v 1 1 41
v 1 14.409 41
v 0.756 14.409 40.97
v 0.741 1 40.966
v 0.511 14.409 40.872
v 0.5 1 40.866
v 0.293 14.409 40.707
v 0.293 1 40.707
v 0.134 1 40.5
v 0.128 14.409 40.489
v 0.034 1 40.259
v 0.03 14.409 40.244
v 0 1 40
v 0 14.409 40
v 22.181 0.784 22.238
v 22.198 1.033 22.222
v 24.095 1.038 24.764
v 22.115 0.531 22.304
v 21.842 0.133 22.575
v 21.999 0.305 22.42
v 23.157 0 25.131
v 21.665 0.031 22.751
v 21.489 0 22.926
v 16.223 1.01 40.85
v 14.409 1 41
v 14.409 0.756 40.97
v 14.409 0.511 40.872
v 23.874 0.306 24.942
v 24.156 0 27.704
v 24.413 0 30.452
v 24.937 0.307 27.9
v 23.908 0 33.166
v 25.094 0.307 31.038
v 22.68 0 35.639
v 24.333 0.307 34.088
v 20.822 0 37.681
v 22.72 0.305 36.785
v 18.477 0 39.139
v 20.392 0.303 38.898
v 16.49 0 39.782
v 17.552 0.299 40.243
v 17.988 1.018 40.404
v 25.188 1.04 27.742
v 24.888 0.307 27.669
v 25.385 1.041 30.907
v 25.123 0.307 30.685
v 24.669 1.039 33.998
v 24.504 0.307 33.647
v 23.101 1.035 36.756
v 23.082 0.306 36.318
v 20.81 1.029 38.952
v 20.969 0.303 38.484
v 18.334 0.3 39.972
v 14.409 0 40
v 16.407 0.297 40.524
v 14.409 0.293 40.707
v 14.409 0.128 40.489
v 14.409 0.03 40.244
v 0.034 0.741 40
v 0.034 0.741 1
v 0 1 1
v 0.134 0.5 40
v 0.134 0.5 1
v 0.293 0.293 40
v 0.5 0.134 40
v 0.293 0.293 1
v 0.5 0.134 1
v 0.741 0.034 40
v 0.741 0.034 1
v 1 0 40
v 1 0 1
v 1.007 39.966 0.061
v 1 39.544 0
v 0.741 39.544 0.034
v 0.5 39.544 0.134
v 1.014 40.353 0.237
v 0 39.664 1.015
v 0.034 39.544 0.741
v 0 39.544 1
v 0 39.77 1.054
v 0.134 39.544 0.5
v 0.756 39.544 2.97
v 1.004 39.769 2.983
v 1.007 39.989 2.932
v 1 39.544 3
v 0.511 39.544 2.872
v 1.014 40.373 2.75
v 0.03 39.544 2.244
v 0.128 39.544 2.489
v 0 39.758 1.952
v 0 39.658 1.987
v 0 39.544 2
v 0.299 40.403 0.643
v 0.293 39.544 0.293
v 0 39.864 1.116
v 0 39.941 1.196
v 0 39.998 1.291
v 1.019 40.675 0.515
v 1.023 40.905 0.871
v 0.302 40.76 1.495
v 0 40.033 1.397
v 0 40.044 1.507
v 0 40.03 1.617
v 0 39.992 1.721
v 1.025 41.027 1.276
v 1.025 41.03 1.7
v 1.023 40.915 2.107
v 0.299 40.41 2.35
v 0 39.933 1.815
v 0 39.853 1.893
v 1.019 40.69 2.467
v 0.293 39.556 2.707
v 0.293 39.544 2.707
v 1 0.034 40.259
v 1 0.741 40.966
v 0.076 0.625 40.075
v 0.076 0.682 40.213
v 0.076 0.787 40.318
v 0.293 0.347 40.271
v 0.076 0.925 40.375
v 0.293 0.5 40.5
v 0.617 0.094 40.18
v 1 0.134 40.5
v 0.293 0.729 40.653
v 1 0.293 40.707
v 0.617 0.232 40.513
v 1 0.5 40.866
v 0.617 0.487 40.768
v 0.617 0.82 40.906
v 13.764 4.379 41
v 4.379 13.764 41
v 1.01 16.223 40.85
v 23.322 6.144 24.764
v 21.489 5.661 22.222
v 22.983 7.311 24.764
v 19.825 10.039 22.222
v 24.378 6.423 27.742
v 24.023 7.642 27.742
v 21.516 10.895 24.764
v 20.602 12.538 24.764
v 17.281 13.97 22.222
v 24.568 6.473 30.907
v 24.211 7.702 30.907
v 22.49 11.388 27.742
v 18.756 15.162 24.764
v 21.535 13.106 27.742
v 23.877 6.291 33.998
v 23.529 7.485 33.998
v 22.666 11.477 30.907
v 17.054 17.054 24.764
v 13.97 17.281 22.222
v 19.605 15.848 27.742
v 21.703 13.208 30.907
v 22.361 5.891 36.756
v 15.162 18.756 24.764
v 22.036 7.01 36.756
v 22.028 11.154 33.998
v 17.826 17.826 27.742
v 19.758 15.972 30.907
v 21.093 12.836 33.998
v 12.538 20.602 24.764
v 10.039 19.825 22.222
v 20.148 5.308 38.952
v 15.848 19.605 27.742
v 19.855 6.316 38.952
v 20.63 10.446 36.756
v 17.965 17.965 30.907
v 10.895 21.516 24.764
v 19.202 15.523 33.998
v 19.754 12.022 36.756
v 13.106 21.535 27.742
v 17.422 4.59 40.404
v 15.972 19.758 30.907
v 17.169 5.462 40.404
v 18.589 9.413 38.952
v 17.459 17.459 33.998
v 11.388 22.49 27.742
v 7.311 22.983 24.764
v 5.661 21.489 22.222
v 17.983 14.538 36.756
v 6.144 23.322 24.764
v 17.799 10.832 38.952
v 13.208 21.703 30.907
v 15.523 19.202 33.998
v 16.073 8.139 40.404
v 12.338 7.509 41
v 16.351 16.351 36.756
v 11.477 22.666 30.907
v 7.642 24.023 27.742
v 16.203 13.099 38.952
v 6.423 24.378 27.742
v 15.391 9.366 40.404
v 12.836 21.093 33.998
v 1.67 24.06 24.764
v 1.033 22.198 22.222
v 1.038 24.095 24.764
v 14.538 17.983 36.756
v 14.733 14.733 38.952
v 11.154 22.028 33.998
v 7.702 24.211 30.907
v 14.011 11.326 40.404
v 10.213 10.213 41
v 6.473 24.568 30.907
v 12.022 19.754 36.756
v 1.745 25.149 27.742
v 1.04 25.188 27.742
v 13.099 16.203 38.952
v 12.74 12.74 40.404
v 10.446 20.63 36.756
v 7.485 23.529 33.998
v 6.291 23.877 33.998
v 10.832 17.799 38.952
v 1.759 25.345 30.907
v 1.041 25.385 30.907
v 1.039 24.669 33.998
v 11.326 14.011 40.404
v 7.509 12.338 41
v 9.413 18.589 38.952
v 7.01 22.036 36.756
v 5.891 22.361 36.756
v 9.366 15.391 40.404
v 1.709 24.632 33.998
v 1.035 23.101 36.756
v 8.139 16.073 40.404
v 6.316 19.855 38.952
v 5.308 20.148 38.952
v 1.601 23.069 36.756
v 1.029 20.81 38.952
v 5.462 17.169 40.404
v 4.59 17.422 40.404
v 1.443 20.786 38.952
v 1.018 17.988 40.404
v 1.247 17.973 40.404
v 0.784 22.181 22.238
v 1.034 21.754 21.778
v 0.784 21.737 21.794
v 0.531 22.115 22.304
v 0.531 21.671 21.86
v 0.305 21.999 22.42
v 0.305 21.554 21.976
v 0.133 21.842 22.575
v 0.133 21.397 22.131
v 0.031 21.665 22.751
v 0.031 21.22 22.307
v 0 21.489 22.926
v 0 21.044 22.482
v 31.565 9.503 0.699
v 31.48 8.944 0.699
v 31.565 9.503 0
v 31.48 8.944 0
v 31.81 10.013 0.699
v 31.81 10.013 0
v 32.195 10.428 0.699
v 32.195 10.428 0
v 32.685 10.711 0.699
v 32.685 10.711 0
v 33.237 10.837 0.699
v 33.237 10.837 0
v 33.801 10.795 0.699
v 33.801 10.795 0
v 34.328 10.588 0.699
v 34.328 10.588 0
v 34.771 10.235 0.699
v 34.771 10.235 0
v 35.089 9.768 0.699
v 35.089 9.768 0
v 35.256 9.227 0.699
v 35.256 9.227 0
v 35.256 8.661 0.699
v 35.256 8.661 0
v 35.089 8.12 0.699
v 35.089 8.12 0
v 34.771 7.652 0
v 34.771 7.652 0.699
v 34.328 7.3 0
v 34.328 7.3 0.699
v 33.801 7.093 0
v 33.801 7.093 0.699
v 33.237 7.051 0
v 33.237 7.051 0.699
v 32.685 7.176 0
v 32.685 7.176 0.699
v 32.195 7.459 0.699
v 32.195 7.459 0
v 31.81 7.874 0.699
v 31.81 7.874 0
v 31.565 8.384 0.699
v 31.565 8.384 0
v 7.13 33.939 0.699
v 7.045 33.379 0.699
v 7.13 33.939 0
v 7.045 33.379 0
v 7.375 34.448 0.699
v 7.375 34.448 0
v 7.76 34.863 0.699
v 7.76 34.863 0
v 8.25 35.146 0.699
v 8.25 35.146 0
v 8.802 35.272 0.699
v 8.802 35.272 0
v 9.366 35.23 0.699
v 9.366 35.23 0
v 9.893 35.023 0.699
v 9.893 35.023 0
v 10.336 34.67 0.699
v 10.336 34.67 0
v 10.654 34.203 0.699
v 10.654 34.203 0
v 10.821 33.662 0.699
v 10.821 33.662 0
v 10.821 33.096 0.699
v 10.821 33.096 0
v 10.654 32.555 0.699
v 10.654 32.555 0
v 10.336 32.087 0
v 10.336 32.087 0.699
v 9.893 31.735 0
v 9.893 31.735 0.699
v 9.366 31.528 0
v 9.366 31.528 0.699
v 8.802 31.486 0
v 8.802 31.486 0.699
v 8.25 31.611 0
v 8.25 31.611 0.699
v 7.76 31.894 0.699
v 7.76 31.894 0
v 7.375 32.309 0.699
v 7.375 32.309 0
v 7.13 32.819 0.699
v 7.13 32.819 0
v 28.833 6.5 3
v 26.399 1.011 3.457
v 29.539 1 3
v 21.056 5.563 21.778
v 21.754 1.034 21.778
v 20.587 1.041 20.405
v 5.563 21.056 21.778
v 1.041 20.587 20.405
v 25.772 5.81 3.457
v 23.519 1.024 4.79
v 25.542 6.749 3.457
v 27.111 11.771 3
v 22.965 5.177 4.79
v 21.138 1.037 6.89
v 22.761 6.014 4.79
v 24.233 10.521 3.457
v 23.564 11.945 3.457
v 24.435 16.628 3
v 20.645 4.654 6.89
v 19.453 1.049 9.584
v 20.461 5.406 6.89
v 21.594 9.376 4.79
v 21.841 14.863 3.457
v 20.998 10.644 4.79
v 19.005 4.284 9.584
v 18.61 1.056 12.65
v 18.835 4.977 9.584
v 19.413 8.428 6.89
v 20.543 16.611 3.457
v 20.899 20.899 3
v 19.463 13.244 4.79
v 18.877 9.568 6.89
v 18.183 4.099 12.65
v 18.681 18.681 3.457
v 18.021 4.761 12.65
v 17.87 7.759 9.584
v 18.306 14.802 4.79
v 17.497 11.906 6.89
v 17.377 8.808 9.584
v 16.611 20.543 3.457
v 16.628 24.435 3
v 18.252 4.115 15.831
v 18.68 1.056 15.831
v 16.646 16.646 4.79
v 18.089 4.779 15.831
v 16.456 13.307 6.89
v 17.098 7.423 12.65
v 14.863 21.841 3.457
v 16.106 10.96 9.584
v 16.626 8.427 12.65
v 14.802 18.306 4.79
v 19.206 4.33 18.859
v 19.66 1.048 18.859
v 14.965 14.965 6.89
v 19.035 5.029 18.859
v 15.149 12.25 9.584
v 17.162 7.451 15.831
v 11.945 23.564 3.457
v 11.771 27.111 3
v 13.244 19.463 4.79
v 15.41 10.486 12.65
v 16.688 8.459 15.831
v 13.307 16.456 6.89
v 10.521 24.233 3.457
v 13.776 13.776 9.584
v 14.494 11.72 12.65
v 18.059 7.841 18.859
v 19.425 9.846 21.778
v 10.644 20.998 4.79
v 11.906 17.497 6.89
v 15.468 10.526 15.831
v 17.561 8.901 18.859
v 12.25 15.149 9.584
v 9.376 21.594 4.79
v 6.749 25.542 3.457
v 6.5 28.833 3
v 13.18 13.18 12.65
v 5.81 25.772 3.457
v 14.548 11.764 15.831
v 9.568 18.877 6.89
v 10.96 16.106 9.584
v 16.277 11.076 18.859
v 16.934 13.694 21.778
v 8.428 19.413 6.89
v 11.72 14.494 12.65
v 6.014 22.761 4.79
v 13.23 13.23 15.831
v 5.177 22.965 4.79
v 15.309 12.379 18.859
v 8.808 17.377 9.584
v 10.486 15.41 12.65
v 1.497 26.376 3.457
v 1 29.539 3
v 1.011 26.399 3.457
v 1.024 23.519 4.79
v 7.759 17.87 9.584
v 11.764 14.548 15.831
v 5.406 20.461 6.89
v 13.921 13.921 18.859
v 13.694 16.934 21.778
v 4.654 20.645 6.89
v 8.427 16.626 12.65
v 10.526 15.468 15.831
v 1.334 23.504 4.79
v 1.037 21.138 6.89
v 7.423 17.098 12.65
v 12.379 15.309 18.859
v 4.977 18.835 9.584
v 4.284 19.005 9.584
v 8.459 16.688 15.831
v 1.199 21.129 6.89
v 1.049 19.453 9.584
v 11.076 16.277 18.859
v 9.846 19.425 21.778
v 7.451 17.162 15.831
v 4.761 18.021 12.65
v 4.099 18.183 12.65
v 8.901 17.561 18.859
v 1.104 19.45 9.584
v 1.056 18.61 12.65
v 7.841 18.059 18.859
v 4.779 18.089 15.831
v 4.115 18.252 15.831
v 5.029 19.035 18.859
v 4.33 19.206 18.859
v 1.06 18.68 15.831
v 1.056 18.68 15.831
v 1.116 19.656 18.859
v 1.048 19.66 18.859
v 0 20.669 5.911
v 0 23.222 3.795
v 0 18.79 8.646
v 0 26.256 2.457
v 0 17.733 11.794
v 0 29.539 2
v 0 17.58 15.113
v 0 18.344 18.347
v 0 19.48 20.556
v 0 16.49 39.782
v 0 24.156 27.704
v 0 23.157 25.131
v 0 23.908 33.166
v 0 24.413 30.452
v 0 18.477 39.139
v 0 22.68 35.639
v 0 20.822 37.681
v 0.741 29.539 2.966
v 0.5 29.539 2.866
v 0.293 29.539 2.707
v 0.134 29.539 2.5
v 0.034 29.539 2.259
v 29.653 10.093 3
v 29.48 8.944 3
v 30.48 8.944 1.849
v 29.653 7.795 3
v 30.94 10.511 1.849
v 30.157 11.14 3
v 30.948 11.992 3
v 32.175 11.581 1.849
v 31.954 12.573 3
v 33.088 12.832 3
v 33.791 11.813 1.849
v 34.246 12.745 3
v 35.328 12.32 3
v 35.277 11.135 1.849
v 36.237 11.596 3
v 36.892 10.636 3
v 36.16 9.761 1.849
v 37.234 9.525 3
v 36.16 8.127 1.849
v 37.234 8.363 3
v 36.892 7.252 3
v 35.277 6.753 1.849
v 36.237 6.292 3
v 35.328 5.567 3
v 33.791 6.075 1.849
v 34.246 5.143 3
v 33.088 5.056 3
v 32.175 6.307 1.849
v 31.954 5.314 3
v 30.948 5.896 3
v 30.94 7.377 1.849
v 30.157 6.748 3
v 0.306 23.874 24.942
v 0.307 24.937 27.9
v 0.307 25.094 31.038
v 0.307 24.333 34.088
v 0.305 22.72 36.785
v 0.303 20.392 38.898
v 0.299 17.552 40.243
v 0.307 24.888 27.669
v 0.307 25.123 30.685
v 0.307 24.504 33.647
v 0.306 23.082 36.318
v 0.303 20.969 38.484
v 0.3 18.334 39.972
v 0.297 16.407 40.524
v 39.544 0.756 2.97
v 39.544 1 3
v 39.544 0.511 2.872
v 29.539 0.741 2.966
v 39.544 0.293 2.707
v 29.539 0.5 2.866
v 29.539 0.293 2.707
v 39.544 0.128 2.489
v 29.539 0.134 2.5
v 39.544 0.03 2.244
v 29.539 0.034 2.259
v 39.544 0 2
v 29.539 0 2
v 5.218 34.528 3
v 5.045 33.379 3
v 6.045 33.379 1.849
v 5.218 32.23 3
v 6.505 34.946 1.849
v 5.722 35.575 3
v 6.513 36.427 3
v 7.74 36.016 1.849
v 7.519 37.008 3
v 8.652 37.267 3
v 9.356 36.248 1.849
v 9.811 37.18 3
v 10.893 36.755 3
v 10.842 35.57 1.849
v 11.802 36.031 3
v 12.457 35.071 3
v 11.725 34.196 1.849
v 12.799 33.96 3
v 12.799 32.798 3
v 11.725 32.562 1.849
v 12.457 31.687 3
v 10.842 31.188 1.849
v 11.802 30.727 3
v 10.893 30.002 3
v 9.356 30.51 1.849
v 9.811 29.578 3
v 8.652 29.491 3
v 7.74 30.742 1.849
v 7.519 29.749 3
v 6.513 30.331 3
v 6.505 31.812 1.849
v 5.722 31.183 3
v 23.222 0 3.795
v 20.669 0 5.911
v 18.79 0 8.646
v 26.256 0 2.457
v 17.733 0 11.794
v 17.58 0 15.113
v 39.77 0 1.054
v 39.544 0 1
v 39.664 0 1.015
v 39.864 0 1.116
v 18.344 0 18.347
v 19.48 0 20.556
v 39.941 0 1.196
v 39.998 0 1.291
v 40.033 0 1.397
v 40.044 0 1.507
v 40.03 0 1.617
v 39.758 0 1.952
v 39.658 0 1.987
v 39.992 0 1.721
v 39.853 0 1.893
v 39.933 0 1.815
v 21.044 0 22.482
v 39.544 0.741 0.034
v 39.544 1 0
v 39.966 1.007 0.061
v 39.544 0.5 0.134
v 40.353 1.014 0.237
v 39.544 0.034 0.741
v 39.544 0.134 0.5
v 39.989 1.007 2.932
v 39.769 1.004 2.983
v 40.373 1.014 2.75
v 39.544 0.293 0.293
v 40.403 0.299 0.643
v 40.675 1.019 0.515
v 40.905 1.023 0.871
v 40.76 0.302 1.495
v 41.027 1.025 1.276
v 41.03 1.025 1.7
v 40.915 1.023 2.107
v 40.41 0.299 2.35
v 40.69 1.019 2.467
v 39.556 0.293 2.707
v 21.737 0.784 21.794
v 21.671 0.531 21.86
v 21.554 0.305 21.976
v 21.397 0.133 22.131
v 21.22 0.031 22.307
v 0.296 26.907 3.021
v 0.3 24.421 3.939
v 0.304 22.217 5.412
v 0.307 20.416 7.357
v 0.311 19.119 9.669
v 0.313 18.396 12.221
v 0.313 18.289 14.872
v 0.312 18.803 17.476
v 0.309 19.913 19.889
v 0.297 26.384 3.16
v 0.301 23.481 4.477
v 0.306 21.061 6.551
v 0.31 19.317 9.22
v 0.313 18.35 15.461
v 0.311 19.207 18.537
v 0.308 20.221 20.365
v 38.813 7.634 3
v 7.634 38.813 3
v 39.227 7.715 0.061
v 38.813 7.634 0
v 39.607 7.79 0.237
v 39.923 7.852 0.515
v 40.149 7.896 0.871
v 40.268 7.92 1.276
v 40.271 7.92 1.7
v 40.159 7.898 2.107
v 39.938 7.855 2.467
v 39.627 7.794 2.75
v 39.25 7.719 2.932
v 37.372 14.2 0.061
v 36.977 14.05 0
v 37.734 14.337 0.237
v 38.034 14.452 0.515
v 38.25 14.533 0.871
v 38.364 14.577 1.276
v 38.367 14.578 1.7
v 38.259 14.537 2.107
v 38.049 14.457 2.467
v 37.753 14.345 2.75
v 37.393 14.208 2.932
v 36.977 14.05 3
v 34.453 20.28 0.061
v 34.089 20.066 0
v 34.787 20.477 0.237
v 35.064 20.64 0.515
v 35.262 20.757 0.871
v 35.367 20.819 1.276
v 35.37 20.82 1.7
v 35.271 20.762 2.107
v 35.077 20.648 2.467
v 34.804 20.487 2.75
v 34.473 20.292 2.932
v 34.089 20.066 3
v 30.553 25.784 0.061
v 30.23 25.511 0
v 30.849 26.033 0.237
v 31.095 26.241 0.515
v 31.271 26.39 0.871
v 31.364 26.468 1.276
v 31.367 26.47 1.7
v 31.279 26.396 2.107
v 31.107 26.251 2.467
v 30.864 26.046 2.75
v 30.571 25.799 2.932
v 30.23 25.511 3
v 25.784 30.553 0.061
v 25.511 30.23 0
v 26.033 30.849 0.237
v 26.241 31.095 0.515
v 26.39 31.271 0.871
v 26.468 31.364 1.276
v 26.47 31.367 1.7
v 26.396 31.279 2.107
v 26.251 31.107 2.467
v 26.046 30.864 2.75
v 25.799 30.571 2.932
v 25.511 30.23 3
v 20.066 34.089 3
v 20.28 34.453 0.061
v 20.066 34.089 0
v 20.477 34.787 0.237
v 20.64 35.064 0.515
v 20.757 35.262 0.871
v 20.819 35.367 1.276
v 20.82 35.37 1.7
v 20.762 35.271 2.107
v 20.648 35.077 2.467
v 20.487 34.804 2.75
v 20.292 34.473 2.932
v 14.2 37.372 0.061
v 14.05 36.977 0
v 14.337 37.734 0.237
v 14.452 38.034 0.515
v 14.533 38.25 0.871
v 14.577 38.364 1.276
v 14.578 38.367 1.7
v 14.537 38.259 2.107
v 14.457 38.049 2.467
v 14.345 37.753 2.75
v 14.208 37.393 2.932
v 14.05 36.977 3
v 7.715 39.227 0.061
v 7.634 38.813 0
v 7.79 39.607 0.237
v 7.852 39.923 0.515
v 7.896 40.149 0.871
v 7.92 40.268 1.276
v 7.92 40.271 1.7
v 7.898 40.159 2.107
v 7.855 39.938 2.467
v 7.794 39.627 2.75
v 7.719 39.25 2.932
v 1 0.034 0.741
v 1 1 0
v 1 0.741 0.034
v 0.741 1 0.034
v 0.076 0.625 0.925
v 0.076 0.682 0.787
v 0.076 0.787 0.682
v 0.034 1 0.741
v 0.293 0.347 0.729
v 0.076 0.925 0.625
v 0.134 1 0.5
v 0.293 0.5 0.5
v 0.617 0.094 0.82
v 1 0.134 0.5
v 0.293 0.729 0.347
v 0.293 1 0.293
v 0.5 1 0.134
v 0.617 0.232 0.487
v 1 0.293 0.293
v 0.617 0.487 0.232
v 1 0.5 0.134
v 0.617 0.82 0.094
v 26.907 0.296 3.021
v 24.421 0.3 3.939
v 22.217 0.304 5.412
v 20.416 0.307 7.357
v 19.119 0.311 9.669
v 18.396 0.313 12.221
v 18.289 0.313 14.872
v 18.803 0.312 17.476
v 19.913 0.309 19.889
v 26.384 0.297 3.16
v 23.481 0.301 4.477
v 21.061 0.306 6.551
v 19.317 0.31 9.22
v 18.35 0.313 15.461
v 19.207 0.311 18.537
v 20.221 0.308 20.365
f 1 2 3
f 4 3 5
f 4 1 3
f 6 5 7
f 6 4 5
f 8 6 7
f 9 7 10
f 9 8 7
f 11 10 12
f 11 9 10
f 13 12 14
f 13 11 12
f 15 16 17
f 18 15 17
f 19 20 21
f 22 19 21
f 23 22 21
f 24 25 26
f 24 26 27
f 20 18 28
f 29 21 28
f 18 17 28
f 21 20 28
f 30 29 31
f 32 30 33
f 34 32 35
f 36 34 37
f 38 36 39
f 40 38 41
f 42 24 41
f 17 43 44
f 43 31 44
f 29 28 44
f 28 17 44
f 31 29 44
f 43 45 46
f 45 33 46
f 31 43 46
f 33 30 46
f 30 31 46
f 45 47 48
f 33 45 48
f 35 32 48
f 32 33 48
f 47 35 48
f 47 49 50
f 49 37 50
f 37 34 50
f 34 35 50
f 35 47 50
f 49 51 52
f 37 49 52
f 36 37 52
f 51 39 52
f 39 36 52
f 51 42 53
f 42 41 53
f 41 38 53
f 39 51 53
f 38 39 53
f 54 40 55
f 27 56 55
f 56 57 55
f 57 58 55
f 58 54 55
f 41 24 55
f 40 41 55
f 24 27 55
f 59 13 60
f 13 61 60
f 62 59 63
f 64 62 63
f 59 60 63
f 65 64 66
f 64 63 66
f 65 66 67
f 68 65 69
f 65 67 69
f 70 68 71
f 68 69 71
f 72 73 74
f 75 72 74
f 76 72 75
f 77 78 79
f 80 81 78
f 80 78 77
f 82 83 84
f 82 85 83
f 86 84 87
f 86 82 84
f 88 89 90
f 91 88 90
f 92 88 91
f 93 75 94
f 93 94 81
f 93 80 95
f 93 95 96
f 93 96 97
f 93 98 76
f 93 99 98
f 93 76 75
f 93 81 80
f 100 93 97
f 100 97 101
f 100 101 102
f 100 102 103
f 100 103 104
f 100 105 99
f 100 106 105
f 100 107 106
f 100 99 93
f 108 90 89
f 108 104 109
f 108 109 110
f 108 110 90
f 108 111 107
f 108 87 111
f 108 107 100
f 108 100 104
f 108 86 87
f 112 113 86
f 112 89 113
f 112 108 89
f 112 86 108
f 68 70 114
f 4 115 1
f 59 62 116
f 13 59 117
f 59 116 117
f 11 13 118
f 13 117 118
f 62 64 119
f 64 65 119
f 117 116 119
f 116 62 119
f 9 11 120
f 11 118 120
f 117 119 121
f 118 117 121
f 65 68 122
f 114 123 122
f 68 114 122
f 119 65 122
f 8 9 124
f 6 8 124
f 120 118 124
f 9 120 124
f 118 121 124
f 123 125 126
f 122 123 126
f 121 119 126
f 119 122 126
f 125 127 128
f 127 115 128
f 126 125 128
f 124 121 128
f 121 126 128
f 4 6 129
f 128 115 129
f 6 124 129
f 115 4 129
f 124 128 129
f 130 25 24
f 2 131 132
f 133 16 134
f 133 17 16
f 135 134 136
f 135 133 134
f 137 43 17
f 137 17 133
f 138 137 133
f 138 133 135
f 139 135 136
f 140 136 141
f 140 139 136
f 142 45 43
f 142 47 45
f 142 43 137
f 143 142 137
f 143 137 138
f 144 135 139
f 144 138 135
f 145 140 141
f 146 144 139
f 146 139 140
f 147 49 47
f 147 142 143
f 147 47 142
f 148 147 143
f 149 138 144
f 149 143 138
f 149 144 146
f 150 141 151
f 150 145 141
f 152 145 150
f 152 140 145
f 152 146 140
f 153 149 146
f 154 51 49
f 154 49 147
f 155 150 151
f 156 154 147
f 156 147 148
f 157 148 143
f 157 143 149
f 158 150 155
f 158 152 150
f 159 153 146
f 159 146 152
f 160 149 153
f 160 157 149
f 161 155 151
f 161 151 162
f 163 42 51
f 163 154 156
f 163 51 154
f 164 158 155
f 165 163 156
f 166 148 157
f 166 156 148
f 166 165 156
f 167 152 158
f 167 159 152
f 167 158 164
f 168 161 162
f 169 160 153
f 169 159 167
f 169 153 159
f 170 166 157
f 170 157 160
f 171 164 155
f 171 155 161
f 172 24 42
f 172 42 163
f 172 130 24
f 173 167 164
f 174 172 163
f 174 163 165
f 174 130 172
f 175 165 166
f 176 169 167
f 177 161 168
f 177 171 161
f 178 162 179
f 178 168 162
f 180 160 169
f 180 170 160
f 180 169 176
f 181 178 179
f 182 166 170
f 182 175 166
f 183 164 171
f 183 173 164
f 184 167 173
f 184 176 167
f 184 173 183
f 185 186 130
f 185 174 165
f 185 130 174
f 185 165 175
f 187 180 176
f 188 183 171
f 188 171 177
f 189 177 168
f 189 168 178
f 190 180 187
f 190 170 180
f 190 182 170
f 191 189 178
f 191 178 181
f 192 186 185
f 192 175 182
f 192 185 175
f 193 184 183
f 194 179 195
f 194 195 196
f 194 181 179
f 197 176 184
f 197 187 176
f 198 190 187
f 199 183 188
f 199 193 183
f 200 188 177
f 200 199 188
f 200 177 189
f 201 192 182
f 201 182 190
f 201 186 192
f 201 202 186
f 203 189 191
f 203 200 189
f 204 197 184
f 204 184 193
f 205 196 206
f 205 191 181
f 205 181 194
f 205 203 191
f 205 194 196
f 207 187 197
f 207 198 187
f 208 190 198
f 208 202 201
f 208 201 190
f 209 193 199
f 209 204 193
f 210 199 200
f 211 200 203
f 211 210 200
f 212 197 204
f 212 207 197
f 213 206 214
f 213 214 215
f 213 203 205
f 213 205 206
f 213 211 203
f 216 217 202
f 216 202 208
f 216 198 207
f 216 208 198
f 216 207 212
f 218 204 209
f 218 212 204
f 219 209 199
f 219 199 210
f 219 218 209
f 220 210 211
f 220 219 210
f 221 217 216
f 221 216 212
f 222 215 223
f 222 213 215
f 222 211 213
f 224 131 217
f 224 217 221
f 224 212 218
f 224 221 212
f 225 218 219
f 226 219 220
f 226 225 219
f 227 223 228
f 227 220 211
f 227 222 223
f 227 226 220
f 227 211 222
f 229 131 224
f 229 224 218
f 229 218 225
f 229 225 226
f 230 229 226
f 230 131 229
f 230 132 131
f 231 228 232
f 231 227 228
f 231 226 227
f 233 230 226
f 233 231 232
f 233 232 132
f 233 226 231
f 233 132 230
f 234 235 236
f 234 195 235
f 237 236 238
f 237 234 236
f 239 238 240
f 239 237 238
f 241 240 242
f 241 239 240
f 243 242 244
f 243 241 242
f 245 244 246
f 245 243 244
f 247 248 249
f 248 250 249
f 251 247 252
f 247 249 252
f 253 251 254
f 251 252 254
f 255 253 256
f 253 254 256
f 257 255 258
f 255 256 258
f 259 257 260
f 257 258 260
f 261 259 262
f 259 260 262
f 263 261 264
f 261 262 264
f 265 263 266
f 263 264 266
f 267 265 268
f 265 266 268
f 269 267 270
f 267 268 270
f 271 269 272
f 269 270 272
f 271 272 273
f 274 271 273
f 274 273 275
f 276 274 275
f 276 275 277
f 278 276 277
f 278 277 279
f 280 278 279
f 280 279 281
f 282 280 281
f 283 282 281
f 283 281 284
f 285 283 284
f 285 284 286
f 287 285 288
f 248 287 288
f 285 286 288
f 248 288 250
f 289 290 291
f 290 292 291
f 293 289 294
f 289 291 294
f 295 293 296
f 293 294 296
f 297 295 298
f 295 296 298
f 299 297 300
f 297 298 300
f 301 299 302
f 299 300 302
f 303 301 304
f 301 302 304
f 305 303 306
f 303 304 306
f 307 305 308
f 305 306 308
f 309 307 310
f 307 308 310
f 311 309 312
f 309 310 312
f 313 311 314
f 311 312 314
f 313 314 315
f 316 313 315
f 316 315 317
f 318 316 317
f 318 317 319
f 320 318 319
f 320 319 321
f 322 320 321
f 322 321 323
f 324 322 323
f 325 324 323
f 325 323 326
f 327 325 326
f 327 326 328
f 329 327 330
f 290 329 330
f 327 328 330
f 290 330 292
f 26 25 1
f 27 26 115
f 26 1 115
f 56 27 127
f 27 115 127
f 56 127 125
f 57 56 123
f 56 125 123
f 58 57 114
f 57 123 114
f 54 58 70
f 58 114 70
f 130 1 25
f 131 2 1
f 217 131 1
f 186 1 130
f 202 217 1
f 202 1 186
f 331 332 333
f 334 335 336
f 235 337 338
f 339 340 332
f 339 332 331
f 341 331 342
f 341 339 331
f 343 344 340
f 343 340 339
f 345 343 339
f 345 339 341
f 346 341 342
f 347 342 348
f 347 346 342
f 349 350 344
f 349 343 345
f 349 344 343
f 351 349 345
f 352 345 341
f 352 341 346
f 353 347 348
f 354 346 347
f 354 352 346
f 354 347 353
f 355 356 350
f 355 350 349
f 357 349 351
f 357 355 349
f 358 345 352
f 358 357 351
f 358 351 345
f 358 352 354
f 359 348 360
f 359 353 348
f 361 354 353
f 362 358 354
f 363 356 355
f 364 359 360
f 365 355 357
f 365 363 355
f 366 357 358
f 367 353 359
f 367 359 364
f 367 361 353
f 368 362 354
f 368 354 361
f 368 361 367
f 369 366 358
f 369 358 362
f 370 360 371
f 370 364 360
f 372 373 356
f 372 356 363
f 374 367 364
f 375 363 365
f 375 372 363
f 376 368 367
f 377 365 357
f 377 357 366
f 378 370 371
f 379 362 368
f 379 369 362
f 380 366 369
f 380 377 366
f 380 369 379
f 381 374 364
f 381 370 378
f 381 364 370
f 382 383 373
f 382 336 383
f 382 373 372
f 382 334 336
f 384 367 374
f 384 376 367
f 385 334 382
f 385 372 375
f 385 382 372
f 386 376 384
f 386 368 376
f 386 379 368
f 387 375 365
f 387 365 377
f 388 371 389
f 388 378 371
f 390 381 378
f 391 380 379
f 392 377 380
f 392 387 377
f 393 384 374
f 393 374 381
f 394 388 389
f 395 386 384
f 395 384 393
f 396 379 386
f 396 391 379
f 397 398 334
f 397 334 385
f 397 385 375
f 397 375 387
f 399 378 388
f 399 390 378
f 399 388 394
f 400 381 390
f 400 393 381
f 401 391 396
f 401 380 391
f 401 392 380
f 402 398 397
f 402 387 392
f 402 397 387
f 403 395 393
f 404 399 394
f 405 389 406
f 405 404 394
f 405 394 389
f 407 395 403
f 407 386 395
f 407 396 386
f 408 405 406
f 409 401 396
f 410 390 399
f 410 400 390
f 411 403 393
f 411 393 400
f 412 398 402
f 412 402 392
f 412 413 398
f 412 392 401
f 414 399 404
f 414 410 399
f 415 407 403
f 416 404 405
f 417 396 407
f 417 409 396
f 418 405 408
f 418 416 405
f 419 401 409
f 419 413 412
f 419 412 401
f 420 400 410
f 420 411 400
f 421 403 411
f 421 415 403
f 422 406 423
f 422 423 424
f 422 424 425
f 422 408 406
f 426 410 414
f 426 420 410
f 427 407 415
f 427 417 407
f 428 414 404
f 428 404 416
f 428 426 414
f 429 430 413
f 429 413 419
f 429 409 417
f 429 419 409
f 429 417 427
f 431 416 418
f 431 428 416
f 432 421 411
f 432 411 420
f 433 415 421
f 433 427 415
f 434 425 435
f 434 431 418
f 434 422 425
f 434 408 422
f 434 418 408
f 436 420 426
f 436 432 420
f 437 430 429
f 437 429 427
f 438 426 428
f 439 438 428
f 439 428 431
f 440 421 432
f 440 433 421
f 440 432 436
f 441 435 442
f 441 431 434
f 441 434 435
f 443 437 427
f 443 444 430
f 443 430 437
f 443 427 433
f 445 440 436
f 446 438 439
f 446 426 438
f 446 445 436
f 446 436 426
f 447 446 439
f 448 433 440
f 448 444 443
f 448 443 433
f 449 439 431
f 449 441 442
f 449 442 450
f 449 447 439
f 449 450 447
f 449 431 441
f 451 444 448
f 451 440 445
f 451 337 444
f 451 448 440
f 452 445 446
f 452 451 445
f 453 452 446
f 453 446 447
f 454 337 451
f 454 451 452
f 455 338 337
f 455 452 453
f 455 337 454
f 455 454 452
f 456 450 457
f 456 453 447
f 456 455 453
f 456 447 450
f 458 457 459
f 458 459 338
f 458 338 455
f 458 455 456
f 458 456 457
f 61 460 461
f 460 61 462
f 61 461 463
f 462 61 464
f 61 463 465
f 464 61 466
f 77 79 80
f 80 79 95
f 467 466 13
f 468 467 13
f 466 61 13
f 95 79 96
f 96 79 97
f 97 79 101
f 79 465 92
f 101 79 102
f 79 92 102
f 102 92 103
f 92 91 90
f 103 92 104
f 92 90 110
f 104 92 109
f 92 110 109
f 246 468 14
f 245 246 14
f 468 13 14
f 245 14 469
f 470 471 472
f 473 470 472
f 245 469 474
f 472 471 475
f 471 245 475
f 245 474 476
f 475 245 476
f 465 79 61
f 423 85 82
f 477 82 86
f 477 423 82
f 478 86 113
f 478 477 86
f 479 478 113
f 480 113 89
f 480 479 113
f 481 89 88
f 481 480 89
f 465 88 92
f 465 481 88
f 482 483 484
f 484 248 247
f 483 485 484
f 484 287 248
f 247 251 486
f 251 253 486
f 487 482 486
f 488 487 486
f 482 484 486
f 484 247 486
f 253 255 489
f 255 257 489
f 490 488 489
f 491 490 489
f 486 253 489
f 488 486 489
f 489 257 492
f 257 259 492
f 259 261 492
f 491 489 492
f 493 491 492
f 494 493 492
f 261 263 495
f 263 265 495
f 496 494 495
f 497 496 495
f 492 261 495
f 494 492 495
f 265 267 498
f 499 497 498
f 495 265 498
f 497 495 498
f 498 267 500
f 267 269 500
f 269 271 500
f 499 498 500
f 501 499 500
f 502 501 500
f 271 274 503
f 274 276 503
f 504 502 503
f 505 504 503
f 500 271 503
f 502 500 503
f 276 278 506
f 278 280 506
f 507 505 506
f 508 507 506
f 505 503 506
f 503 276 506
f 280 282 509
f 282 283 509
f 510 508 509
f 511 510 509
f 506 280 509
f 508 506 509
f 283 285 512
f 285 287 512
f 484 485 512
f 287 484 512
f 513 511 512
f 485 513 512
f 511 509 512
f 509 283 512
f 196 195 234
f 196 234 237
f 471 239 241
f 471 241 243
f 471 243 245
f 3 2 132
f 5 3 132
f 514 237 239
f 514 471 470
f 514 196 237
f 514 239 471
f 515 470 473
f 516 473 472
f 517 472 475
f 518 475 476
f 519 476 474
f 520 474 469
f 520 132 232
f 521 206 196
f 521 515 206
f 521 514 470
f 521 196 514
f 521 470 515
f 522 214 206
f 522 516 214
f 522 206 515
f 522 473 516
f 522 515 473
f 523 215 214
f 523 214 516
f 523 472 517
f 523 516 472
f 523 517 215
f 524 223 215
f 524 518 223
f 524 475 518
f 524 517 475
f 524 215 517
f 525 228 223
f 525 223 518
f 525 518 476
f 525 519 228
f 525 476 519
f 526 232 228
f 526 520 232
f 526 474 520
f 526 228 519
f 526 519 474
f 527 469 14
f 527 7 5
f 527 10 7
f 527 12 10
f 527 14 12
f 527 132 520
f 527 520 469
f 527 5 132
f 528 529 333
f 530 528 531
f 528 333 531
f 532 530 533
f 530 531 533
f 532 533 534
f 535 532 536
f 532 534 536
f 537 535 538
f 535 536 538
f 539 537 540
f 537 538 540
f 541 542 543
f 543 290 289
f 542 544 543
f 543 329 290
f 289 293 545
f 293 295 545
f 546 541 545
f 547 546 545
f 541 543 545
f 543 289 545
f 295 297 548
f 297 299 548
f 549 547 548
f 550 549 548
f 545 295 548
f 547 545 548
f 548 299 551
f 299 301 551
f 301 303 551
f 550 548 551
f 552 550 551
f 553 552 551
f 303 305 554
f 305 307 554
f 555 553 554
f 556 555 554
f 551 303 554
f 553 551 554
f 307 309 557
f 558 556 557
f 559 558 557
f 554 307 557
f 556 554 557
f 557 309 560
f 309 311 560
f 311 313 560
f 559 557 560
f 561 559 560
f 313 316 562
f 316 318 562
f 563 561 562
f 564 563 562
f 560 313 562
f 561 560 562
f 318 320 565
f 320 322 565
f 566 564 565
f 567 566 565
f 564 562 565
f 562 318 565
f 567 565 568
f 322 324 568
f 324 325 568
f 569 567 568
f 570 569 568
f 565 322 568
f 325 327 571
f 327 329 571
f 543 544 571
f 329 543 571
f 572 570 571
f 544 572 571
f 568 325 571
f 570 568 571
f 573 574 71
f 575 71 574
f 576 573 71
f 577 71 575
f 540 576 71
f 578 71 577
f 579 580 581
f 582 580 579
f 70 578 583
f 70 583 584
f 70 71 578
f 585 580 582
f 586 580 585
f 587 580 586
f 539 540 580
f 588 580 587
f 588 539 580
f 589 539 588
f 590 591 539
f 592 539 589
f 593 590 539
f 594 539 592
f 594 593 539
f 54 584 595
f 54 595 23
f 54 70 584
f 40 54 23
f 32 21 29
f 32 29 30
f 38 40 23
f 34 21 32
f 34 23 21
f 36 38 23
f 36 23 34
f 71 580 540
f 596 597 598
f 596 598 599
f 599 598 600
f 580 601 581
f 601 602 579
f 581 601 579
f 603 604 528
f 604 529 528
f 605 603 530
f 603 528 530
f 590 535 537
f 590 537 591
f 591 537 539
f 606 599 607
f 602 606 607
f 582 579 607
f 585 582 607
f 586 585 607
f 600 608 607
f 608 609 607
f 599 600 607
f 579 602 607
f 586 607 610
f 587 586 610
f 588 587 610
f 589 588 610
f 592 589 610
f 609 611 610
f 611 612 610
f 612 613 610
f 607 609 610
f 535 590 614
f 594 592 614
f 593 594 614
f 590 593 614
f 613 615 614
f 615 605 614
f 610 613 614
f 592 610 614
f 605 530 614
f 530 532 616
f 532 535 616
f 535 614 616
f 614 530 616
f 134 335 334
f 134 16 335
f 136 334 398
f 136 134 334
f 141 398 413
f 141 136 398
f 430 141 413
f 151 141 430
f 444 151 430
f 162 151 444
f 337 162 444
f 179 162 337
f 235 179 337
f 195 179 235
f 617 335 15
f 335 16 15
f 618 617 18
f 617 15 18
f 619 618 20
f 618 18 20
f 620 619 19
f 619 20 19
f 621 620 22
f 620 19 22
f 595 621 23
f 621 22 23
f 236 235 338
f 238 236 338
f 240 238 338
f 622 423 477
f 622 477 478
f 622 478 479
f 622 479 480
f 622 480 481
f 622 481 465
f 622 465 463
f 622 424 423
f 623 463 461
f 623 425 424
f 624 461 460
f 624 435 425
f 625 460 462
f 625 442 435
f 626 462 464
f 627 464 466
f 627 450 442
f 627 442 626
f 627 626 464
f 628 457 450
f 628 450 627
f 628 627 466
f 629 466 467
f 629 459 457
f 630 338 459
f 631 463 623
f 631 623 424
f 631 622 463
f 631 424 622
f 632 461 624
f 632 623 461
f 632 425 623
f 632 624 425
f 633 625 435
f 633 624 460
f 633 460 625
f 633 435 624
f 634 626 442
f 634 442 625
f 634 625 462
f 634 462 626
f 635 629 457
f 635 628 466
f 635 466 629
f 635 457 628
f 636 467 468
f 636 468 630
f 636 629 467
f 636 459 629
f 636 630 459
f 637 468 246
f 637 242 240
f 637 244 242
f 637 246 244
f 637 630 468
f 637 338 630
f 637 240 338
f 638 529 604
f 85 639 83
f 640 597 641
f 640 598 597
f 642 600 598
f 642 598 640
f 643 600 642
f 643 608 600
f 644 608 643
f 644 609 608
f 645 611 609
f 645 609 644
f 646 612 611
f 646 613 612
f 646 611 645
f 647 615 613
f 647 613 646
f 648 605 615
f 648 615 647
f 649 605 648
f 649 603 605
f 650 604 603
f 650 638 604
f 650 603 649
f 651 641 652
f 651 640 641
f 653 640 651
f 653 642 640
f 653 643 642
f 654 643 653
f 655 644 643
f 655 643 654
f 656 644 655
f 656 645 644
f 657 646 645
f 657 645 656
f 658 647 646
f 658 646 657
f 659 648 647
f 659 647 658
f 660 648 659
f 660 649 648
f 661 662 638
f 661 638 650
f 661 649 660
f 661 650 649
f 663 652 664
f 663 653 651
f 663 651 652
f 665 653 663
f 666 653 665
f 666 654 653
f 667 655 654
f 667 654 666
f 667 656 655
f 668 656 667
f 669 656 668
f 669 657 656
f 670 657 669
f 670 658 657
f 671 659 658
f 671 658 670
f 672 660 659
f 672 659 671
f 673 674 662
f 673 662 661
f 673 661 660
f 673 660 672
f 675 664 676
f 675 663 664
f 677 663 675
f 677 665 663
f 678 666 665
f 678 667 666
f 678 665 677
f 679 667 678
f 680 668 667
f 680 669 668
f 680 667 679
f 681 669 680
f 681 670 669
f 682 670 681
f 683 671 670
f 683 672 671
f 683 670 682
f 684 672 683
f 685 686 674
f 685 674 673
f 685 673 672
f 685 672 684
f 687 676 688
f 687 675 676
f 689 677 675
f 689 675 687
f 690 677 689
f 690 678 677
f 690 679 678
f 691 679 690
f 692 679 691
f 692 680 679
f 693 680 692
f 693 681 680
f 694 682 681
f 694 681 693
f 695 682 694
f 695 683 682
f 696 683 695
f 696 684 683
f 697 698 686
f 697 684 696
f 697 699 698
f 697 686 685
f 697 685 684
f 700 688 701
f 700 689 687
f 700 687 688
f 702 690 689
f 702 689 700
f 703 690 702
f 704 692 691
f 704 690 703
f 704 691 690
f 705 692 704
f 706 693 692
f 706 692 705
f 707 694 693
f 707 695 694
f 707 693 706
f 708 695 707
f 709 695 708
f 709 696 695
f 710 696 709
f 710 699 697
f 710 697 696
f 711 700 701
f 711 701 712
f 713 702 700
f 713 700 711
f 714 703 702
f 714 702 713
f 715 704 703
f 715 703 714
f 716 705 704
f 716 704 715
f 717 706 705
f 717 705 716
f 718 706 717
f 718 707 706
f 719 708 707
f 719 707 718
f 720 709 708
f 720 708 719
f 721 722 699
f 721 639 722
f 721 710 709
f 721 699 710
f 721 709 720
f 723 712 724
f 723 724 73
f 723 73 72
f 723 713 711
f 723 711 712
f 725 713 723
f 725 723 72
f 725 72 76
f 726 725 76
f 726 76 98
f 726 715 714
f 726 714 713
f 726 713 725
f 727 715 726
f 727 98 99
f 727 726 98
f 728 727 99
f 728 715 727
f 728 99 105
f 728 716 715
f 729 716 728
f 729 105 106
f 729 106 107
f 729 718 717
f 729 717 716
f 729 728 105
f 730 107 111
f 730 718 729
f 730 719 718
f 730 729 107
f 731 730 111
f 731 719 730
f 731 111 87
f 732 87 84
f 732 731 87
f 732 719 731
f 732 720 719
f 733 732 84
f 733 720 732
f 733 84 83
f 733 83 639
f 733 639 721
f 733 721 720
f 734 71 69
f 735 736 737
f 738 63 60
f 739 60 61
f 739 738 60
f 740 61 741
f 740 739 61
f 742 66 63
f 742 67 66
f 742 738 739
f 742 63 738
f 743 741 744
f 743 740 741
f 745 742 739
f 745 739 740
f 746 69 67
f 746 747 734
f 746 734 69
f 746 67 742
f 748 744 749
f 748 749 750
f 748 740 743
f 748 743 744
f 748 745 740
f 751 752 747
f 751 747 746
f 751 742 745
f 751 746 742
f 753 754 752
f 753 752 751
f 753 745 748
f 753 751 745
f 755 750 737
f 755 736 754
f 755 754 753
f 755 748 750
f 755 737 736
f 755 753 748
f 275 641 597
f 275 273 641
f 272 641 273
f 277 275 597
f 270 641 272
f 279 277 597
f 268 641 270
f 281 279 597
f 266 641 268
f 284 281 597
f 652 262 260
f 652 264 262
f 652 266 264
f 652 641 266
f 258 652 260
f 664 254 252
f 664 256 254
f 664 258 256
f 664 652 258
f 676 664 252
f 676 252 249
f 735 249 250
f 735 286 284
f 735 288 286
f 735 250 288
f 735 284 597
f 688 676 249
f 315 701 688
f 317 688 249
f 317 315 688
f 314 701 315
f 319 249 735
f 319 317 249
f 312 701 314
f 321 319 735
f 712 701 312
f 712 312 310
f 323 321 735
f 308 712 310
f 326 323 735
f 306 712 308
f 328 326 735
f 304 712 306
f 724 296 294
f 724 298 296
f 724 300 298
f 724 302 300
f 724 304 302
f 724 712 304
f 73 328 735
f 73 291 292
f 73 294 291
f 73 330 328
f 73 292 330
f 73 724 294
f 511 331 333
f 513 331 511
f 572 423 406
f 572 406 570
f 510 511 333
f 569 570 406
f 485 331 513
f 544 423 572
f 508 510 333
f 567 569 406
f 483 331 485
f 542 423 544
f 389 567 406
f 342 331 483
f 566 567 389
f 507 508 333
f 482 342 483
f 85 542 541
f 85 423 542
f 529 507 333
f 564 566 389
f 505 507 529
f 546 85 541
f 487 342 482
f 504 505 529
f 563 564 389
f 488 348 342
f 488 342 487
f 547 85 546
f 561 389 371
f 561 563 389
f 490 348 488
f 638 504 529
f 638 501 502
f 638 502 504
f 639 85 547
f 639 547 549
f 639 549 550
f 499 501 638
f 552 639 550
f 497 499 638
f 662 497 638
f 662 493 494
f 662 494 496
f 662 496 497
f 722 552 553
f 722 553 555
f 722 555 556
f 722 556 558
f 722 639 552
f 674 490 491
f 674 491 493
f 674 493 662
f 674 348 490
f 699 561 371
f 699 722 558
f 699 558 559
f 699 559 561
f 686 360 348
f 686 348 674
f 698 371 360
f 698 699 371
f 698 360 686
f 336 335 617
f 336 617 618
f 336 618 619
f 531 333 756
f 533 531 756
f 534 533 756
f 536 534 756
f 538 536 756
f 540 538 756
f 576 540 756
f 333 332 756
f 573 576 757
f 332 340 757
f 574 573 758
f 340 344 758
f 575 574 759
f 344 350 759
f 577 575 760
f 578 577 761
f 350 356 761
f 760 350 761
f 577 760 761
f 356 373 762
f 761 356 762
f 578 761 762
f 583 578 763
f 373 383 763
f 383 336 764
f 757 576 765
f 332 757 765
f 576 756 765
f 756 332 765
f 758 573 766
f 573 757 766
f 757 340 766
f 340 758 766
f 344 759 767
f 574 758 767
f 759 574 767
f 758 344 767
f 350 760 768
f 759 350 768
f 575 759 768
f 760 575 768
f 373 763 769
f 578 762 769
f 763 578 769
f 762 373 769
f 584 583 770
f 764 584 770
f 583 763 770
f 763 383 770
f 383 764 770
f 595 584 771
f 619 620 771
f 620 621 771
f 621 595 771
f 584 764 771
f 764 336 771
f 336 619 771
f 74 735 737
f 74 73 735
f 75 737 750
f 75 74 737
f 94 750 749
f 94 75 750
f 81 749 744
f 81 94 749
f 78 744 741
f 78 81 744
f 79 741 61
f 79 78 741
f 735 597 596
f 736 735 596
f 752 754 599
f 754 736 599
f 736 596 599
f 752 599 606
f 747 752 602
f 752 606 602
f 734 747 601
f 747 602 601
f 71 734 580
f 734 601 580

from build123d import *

# Parameters (mm, degrees)
F1_ANGLE       = 90
F3_D           = 3.7973
F3_CSINK_D     = 7.7978
F3_CSINK_ANGLE = 82
F4_R           = 1


with BuildPart() as f1:
    # F0 (on Front) → F1 (revolve)
    with BuildSketch(Plane.XZ):
        with BuildLine():
            ThreePointArc((29.5563491861, 3), (19.3936743285, 9.790482244), (21.7781745931, 21.7781745931))
            Line((21.7781745931, 21.7781745931), (22.2218254069, 22.2218254069))
            ThreePointArc((22.2218254069, 22.2218254069), (24.6063256715, 34.209517756), (14.4436508139, 41))
            Line((14.4436508139, 41), (0, 41))
            Line((0, 41), (0, 0))
            Line((0, 0), (39.5563491861, 0))
            ThreePointArc((39.5563491861, 0), (41.0563491861, 1.5), (39.5563491861, 3))
            Line((39.5563491861, 3), (29.5563491861, 3))
        make_face()
    revolve(axis=Axis((0, 0, 20.5), (0, 0, 1)), revolution_arc=F1_ANGLE)

    # F3 (through all)
    with Locations(Plane.XY.offset(3)):
        with Locations((8.9438412986, 33.3788701411), (33.3788701411, 8.9438412986)):
            CounterSinkHole(F3_D / 2, F3_CSINK_D / 2, counter_sink_angle=F3_CSINK_ANGLE)

    # F4
    f4_edges = [f1.edges().sort_by_distance(p)[0] for p in [
        (19.393674, 0, 9.790482),
        (22, 0, 22),
        (24.606326, 0, 34.209518),
        (7.221825, 0, 41),
        (0, 0, 20.5),
        (19.778175, 0, 0),
        (41.056349, 0, 1.5),
        (34.556349, 0, 3),
        (0, 19.393674, 9.790482),
        (0, 22, 22),
        (0, 24.606326, 34.209518),
        (0, 7.221825, 41),
        (0, 19.778175, 0),
        (0, 41.056349, 1.5),
        (0, 34.556349, 3),
    ]]
    fillet(f4_edges, radius=F4_R)


solid = f1.part
